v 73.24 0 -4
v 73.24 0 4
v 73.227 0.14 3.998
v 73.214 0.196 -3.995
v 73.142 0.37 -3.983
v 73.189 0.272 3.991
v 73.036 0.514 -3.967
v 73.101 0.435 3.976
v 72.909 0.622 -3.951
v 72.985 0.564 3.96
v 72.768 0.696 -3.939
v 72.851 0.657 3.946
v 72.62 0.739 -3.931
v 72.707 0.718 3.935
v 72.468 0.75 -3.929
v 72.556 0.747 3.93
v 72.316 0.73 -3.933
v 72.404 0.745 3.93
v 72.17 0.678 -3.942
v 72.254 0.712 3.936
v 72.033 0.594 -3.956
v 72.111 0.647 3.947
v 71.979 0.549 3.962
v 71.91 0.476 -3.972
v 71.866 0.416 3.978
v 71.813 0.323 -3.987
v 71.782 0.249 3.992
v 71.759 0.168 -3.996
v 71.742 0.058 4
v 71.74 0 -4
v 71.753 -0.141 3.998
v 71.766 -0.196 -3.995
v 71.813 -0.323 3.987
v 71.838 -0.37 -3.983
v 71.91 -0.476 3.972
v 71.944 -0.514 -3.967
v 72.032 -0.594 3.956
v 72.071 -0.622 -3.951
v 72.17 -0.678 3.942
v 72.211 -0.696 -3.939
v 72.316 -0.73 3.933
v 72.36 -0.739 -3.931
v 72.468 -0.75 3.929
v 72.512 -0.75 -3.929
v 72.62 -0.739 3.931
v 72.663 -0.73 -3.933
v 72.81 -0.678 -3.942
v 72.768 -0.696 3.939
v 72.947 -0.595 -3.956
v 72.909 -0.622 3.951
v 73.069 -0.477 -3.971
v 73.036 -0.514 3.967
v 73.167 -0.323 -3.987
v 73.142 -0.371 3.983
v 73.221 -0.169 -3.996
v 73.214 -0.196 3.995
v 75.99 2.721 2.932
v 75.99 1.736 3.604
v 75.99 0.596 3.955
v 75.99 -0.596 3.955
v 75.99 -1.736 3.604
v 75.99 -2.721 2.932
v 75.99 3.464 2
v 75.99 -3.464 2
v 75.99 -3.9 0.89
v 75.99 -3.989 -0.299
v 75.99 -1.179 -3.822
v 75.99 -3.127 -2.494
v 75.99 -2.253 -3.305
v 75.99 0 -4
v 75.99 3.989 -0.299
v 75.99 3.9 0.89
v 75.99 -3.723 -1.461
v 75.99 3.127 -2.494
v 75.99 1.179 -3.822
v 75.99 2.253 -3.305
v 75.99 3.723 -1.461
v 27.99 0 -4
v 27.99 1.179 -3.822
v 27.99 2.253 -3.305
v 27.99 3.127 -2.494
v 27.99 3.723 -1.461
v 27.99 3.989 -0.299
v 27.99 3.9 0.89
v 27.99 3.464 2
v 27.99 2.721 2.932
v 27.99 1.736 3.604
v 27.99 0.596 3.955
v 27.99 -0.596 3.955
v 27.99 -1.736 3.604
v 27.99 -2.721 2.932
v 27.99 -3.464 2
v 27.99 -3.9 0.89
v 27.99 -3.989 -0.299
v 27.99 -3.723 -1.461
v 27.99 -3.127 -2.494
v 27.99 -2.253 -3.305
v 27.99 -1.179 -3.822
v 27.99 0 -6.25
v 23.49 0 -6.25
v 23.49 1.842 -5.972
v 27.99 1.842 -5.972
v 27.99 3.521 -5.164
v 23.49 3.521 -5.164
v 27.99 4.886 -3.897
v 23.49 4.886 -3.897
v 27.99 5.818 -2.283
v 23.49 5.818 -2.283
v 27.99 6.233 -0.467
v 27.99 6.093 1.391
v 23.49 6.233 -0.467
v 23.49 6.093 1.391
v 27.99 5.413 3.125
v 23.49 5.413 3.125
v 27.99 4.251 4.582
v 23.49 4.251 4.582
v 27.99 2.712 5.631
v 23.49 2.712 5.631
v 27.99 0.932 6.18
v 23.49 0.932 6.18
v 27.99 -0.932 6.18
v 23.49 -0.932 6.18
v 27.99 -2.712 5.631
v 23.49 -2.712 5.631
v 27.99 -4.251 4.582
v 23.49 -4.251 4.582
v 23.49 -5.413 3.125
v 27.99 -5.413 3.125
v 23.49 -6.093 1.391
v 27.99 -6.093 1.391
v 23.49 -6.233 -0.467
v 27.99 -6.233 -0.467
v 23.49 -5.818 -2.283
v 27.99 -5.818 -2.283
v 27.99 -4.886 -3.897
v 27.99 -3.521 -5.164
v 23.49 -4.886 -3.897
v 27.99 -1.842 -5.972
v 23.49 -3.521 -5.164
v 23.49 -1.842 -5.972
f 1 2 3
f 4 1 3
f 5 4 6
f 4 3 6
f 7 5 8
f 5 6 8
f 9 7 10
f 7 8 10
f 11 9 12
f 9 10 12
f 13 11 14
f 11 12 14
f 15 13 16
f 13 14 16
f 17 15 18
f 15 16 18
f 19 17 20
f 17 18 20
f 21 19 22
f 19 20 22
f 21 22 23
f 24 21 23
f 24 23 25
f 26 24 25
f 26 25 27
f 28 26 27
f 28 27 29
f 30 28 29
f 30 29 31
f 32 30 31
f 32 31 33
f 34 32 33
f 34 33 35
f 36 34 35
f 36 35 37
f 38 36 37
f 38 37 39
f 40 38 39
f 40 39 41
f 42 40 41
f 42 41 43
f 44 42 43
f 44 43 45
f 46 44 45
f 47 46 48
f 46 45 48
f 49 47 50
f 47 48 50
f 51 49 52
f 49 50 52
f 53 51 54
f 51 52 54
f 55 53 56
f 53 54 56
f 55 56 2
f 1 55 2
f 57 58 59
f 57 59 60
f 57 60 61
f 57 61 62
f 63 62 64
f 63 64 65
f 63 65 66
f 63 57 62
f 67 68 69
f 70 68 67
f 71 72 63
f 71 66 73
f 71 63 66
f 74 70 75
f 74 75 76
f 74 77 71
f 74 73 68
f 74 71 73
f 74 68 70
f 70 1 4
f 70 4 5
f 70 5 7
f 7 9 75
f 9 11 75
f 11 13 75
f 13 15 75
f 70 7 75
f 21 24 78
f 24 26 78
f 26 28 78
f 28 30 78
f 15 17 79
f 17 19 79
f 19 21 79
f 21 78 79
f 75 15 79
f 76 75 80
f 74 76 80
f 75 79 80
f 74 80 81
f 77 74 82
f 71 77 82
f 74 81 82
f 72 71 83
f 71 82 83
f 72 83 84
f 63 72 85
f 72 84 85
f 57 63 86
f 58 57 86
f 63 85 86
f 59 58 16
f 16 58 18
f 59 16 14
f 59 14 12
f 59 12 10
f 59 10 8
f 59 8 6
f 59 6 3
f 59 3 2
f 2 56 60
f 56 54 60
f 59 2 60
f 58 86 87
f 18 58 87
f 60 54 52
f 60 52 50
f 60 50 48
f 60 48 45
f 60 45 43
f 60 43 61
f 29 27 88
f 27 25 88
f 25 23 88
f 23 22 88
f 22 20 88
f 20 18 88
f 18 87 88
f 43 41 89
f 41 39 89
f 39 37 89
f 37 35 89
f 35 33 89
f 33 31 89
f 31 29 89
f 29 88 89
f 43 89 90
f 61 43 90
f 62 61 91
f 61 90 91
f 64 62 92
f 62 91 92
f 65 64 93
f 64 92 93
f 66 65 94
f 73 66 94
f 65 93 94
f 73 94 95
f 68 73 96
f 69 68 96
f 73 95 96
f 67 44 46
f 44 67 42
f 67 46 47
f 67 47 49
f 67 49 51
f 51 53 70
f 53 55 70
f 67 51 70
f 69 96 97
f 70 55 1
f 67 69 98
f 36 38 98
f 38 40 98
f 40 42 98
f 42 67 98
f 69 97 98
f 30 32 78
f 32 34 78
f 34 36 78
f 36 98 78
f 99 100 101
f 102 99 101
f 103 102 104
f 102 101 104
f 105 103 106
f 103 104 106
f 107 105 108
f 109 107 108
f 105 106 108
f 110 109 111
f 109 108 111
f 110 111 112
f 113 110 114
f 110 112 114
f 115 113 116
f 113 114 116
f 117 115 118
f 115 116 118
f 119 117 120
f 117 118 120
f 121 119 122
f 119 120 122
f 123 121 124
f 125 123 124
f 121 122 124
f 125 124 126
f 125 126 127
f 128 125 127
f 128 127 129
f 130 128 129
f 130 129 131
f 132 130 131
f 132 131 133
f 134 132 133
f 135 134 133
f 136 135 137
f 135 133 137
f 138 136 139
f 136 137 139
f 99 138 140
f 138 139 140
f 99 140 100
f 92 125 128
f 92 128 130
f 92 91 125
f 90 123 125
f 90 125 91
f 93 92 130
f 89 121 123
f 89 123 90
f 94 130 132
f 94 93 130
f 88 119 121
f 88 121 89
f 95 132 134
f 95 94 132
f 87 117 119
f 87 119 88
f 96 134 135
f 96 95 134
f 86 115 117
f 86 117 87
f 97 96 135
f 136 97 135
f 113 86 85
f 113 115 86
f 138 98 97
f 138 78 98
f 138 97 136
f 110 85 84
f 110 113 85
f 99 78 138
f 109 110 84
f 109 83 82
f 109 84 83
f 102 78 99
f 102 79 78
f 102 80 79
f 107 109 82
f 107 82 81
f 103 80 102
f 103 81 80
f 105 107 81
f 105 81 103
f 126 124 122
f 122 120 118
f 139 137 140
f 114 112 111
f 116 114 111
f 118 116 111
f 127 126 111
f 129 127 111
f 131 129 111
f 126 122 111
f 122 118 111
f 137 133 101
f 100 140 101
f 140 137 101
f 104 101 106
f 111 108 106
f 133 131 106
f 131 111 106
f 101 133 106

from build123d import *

# Parameters (mm, degrees)
SKETCH1_R           = 12.5
BOSS_EXTRUDE1_DEPTH = 9
SKETCH2_R           = 8
BOSS_EXTRUDE2_DEPTH = 96
SKETCH4_R           = 1.5
CUT_EXTRUDE1_DEPTH  = 96
ESCALA1_SCALE       = 0.5


with BuildPart() as part:
    # Sketch1 → Boss-Extrude1 (new body)
    with BuildSketch(Plane(origin=(0, 0, 0), x_dir=(0, 0, -1), z_dir=(1, 0, 0))):
        Circle(SKETCH1_R)
    extrude(amount=BOSS_EXTRUDE1_DEPTH)

    # Sketch2 → Boss-Extrude2 (add)
    with BuildSketch(Plane(origin=(9, 0, 0), x_dir=(0, 0, -1), z_dir=(1, 0, 0))):
        Circle(SKETCH2_R)
    extrude(amount=BOSS_EXTRUDE2_DEPTH)

    # Sketch4 → Cut-Extrude1 (cut)
    with BuildSketch(Plane.XY.offset(8)):
        with Locations((98, 0)):
            Circle(SKETCH4_R)
    extrude(amount=-CUT_EXTRUDE1_DEPTH, mode=Mode.SUBTRACT)


with BuildPart() as part_1:
    # Escala1: scaled about (46.97958084, -3.1e-08, 3.35e-07)
    add(part.part.scale(ESCALA1_SCALE).moved(Location((23.48979042, -1.5e-08, 1.68e-07))))


solid = part_1.part
